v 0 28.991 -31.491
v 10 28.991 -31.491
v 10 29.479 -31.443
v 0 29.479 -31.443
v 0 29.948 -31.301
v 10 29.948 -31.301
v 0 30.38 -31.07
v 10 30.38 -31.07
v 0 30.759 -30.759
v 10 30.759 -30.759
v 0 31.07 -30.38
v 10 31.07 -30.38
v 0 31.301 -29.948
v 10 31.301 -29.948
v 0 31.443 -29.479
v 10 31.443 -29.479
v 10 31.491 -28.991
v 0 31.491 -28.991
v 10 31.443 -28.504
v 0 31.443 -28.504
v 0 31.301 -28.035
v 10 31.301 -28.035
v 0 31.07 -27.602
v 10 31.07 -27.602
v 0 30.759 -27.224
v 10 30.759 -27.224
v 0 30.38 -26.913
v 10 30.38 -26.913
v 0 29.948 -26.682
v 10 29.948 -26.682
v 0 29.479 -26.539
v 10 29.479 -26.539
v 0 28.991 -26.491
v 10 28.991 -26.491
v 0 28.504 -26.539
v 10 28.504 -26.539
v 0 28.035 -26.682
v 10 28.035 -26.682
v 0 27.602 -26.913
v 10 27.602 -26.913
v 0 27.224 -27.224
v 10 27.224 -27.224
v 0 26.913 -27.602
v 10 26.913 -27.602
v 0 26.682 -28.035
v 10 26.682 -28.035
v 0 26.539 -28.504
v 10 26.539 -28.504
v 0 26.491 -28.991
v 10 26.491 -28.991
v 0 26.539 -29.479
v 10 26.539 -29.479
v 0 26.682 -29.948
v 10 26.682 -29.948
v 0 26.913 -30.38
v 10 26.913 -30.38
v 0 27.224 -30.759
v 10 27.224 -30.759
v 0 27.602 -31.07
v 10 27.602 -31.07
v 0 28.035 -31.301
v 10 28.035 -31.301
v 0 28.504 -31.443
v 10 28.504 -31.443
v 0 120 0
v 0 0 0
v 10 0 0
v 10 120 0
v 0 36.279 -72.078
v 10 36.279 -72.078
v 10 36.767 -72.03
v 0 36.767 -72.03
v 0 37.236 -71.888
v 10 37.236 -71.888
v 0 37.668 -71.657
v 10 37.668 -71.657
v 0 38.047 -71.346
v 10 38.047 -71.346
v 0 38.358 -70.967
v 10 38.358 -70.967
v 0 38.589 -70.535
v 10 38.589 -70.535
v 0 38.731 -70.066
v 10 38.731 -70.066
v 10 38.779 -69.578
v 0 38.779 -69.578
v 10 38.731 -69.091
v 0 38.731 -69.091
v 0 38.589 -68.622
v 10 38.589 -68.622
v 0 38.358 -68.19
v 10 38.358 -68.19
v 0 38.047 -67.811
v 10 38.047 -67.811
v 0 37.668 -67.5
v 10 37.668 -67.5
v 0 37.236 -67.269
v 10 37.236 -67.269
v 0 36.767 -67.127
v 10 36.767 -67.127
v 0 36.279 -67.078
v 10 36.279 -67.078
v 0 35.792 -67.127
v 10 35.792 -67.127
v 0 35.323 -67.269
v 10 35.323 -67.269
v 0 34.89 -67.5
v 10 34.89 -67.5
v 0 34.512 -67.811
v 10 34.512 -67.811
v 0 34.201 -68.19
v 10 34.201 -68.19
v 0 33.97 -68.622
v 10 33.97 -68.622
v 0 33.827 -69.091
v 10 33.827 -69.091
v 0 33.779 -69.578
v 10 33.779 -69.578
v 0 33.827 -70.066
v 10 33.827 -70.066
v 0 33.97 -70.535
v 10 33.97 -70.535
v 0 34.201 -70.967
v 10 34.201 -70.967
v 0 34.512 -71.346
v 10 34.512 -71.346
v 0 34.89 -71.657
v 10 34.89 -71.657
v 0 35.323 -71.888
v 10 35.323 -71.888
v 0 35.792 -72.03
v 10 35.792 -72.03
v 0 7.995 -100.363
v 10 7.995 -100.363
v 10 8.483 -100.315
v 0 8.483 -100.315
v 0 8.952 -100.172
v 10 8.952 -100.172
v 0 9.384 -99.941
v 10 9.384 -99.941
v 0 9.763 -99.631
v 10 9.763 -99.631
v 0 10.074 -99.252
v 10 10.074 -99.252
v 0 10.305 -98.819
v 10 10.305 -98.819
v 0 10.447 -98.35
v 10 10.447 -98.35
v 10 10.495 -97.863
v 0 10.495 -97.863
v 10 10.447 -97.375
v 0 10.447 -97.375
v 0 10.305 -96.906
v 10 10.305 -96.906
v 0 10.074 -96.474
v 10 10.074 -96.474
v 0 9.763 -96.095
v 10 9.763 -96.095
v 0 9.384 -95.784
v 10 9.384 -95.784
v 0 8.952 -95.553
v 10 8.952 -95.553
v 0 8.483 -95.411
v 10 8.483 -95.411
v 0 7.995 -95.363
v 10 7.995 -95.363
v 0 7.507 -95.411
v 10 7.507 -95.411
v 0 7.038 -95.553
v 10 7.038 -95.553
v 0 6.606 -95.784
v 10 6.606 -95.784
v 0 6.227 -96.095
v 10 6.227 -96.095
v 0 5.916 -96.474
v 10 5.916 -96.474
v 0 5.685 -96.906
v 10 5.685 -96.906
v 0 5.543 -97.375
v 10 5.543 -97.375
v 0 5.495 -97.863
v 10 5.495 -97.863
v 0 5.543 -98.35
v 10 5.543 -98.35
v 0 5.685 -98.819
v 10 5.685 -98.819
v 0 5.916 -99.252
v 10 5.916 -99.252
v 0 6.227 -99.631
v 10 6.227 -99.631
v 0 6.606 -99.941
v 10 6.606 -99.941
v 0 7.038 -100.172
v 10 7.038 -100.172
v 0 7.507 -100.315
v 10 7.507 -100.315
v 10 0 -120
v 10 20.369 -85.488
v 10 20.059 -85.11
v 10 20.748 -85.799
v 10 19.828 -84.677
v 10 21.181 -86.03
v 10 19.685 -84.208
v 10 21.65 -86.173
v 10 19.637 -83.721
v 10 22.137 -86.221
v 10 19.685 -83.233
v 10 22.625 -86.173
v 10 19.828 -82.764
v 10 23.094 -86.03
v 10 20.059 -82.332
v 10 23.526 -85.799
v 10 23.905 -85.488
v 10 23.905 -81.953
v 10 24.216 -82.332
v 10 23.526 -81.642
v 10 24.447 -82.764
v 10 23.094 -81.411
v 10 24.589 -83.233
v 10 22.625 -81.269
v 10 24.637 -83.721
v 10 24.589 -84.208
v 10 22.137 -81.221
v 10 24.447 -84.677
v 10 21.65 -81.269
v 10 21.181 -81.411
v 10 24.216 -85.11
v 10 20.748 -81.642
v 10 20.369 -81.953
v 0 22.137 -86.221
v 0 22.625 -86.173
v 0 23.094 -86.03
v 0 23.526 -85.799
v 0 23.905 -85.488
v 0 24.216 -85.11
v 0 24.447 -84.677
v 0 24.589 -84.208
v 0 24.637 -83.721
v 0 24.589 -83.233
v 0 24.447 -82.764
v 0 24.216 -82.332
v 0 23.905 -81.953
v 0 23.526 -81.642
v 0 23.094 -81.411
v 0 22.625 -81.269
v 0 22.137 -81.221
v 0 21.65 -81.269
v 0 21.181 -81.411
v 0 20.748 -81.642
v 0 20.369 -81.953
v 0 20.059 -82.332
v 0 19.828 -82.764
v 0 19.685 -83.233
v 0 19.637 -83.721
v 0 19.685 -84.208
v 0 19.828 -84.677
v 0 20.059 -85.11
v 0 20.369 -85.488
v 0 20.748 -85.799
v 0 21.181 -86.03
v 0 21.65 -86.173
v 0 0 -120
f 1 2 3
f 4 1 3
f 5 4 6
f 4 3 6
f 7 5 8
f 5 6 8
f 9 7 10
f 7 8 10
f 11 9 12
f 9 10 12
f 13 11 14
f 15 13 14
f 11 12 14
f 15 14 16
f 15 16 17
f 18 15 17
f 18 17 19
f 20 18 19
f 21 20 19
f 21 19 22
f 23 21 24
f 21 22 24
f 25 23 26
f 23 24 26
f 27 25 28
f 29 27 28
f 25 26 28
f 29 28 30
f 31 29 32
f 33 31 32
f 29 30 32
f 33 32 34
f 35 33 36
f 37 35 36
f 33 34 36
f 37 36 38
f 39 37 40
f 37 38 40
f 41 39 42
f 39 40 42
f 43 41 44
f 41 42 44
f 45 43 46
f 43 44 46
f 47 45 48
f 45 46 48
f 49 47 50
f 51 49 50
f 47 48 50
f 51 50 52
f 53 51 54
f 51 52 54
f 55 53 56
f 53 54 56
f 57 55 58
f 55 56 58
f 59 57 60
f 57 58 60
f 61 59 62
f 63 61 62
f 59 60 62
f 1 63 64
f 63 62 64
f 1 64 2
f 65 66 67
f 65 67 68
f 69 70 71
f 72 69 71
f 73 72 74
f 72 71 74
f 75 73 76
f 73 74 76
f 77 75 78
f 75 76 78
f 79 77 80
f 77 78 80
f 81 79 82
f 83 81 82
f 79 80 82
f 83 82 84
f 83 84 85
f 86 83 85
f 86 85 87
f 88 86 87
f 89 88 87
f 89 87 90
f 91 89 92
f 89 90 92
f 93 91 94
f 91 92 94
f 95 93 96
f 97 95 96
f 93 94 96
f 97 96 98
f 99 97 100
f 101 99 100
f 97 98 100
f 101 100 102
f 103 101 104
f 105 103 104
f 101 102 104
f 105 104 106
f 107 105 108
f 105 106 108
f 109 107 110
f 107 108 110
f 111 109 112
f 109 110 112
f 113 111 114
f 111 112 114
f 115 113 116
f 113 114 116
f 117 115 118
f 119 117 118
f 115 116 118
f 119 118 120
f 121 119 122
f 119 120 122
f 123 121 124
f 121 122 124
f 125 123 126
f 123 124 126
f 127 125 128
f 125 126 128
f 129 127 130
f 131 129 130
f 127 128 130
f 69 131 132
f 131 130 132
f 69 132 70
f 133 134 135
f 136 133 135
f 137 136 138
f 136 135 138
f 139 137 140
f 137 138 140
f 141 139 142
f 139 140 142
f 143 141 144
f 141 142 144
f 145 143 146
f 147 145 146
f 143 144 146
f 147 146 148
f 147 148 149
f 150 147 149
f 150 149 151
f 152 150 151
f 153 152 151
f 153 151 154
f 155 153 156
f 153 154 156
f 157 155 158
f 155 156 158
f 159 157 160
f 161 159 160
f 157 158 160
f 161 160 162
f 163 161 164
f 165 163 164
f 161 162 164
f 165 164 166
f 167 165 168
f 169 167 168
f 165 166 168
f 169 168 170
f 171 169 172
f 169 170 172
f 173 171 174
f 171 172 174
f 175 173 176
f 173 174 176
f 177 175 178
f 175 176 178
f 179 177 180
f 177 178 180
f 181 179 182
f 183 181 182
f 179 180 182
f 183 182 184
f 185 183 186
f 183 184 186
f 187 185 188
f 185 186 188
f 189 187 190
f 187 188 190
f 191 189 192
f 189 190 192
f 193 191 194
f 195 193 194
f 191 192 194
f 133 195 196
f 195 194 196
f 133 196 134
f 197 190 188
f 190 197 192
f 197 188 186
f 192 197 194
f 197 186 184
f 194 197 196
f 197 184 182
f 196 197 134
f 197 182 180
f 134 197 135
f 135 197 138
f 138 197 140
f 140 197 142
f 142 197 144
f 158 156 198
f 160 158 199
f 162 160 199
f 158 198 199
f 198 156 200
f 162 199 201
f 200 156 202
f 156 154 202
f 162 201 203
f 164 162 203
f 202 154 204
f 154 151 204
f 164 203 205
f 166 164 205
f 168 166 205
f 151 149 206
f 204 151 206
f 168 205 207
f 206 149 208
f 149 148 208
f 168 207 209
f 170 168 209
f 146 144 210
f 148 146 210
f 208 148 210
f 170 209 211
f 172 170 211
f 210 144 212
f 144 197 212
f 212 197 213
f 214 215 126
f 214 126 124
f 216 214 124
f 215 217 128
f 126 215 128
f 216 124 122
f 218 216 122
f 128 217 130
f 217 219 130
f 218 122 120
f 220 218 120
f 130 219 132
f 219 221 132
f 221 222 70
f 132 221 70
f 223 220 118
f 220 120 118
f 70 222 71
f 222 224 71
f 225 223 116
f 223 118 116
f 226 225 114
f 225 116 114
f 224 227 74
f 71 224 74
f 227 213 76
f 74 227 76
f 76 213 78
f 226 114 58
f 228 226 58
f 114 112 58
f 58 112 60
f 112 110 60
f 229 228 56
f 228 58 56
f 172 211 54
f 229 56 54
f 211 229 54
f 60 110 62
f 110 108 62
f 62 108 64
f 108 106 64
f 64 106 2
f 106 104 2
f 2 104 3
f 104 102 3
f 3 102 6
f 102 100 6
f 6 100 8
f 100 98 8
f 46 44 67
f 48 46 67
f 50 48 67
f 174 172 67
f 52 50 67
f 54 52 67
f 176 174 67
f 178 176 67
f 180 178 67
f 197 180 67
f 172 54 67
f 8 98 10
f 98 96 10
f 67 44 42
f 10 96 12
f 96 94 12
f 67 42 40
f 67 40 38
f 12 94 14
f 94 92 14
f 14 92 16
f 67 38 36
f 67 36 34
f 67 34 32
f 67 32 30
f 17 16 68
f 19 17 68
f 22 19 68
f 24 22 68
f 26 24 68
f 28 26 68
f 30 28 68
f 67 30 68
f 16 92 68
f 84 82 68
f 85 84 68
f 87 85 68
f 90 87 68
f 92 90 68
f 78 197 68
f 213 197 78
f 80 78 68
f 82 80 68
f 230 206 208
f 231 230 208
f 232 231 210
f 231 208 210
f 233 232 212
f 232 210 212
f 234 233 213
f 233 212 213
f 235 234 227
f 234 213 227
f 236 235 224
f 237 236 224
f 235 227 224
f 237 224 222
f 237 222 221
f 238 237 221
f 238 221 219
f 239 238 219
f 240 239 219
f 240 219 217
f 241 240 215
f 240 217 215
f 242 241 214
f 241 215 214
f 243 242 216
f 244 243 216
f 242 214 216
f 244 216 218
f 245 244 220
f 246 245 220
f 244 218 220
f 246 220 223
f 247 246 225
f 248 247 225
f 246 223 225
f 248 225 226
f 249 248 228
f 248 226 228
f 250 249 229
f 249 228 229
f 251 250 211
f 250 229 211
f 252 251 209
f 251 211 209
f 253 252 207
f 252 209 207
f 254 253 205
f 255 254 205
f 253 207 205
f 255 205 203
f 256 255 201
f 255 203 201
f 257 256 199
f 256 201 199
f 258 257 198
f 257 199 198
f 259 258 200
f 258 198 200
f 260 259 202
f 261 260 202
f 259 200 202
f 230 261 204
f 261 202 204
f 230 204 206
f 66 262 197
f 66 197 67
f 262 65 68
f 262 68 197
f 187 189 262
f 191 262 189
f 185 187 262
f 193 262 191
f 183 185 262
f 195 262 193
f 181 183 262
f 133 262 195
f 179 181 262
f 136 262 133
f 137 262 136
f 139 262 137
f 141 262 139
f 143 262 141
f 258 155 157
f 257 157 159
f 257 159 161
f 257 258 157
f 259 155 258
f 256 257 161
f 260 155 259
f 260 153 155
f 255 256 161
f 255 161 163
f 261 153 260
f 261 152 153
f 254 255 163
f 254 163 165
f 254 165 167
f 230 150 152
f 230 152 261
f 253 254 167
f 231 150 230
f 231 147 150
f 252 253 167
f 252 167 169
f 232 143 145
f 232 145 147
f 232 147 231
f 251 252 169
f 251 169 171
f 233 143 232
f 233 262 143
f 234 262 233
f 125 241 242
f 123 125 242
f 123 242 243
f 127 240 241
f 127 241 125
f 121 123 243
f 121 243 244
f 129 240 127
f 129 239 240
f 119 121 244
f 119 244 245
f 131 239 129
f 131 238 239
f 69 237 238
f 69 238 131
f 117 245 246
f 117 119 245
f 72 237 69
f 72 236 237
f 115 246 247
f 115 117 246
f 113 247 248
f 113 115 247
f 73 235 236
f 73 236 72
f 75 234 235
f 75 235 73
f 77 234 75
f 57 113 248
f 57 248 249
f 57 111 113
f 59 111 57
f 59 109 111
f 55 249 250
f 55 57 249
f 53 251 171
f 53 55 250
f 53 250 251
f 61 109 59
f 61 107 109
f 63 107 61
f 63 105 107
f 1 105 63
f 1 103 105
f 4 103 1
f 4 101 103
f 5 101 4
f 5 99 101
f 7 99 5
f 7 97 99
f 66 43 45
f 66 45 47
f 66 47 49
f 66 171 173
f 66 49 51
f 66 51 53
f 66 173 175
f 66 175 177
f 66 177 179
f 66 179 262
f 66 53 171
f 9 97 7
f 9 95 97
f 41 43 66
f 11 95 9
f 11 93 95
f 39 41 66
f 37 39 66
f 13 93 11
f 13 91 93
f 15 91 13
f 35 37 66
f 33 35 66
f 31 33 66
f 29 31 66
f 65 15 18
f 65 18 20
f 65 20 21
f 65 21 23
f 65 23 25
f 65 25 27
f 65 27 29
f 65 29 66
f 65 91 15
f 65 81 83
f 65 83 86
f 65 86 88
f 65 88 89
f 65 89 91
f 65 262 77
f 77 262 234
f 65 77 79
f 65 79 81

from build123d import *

# Parameters (mm, degrees)
BOSS_EXTRUDE1_DEPTH = 10
SKETCH4_R           = 2.5
CUT_EXTRUDE3_DEPTH  = 10


with BuildPart() as part:
    # Sketch1 → Boss-Extrude1 (new body)
    with BuildSketch(Plane(origin=(0, 0, 0), x_dir=(0, 0, -1), z_dir=(1, 0, 0))):
        Polygon((0, 0), (0, 120), (120, 0), align=None)
    extrude(amount=BOSS_EXTRUDE1_DEPTH)

    # Sketch4 → Cut-Extrude3 (cut)
    with BuildSketch(Plane(origin=(10, 0, 0), x_dir=(0, 0, -1), z_dir=(1, 0, 0))):
        with Locations((83.720628574, 22.137235802)):
            Circle(SKETCH4_R)
        with Locations((97.862764198, 7.995100178)):
            Circle(SKETCH4_R)
        with Locations((69.578492951, 36.279371426)):
            Circle(SKETCH4_R)
        with Locations((28.991378029, 28.991378029)):
            Circle(SKETCH4_R)
    extrude(amount=-CUT_EXTRUDE3_DEPTH, mode=Mode.SUBTRACT)


solid = part.part
